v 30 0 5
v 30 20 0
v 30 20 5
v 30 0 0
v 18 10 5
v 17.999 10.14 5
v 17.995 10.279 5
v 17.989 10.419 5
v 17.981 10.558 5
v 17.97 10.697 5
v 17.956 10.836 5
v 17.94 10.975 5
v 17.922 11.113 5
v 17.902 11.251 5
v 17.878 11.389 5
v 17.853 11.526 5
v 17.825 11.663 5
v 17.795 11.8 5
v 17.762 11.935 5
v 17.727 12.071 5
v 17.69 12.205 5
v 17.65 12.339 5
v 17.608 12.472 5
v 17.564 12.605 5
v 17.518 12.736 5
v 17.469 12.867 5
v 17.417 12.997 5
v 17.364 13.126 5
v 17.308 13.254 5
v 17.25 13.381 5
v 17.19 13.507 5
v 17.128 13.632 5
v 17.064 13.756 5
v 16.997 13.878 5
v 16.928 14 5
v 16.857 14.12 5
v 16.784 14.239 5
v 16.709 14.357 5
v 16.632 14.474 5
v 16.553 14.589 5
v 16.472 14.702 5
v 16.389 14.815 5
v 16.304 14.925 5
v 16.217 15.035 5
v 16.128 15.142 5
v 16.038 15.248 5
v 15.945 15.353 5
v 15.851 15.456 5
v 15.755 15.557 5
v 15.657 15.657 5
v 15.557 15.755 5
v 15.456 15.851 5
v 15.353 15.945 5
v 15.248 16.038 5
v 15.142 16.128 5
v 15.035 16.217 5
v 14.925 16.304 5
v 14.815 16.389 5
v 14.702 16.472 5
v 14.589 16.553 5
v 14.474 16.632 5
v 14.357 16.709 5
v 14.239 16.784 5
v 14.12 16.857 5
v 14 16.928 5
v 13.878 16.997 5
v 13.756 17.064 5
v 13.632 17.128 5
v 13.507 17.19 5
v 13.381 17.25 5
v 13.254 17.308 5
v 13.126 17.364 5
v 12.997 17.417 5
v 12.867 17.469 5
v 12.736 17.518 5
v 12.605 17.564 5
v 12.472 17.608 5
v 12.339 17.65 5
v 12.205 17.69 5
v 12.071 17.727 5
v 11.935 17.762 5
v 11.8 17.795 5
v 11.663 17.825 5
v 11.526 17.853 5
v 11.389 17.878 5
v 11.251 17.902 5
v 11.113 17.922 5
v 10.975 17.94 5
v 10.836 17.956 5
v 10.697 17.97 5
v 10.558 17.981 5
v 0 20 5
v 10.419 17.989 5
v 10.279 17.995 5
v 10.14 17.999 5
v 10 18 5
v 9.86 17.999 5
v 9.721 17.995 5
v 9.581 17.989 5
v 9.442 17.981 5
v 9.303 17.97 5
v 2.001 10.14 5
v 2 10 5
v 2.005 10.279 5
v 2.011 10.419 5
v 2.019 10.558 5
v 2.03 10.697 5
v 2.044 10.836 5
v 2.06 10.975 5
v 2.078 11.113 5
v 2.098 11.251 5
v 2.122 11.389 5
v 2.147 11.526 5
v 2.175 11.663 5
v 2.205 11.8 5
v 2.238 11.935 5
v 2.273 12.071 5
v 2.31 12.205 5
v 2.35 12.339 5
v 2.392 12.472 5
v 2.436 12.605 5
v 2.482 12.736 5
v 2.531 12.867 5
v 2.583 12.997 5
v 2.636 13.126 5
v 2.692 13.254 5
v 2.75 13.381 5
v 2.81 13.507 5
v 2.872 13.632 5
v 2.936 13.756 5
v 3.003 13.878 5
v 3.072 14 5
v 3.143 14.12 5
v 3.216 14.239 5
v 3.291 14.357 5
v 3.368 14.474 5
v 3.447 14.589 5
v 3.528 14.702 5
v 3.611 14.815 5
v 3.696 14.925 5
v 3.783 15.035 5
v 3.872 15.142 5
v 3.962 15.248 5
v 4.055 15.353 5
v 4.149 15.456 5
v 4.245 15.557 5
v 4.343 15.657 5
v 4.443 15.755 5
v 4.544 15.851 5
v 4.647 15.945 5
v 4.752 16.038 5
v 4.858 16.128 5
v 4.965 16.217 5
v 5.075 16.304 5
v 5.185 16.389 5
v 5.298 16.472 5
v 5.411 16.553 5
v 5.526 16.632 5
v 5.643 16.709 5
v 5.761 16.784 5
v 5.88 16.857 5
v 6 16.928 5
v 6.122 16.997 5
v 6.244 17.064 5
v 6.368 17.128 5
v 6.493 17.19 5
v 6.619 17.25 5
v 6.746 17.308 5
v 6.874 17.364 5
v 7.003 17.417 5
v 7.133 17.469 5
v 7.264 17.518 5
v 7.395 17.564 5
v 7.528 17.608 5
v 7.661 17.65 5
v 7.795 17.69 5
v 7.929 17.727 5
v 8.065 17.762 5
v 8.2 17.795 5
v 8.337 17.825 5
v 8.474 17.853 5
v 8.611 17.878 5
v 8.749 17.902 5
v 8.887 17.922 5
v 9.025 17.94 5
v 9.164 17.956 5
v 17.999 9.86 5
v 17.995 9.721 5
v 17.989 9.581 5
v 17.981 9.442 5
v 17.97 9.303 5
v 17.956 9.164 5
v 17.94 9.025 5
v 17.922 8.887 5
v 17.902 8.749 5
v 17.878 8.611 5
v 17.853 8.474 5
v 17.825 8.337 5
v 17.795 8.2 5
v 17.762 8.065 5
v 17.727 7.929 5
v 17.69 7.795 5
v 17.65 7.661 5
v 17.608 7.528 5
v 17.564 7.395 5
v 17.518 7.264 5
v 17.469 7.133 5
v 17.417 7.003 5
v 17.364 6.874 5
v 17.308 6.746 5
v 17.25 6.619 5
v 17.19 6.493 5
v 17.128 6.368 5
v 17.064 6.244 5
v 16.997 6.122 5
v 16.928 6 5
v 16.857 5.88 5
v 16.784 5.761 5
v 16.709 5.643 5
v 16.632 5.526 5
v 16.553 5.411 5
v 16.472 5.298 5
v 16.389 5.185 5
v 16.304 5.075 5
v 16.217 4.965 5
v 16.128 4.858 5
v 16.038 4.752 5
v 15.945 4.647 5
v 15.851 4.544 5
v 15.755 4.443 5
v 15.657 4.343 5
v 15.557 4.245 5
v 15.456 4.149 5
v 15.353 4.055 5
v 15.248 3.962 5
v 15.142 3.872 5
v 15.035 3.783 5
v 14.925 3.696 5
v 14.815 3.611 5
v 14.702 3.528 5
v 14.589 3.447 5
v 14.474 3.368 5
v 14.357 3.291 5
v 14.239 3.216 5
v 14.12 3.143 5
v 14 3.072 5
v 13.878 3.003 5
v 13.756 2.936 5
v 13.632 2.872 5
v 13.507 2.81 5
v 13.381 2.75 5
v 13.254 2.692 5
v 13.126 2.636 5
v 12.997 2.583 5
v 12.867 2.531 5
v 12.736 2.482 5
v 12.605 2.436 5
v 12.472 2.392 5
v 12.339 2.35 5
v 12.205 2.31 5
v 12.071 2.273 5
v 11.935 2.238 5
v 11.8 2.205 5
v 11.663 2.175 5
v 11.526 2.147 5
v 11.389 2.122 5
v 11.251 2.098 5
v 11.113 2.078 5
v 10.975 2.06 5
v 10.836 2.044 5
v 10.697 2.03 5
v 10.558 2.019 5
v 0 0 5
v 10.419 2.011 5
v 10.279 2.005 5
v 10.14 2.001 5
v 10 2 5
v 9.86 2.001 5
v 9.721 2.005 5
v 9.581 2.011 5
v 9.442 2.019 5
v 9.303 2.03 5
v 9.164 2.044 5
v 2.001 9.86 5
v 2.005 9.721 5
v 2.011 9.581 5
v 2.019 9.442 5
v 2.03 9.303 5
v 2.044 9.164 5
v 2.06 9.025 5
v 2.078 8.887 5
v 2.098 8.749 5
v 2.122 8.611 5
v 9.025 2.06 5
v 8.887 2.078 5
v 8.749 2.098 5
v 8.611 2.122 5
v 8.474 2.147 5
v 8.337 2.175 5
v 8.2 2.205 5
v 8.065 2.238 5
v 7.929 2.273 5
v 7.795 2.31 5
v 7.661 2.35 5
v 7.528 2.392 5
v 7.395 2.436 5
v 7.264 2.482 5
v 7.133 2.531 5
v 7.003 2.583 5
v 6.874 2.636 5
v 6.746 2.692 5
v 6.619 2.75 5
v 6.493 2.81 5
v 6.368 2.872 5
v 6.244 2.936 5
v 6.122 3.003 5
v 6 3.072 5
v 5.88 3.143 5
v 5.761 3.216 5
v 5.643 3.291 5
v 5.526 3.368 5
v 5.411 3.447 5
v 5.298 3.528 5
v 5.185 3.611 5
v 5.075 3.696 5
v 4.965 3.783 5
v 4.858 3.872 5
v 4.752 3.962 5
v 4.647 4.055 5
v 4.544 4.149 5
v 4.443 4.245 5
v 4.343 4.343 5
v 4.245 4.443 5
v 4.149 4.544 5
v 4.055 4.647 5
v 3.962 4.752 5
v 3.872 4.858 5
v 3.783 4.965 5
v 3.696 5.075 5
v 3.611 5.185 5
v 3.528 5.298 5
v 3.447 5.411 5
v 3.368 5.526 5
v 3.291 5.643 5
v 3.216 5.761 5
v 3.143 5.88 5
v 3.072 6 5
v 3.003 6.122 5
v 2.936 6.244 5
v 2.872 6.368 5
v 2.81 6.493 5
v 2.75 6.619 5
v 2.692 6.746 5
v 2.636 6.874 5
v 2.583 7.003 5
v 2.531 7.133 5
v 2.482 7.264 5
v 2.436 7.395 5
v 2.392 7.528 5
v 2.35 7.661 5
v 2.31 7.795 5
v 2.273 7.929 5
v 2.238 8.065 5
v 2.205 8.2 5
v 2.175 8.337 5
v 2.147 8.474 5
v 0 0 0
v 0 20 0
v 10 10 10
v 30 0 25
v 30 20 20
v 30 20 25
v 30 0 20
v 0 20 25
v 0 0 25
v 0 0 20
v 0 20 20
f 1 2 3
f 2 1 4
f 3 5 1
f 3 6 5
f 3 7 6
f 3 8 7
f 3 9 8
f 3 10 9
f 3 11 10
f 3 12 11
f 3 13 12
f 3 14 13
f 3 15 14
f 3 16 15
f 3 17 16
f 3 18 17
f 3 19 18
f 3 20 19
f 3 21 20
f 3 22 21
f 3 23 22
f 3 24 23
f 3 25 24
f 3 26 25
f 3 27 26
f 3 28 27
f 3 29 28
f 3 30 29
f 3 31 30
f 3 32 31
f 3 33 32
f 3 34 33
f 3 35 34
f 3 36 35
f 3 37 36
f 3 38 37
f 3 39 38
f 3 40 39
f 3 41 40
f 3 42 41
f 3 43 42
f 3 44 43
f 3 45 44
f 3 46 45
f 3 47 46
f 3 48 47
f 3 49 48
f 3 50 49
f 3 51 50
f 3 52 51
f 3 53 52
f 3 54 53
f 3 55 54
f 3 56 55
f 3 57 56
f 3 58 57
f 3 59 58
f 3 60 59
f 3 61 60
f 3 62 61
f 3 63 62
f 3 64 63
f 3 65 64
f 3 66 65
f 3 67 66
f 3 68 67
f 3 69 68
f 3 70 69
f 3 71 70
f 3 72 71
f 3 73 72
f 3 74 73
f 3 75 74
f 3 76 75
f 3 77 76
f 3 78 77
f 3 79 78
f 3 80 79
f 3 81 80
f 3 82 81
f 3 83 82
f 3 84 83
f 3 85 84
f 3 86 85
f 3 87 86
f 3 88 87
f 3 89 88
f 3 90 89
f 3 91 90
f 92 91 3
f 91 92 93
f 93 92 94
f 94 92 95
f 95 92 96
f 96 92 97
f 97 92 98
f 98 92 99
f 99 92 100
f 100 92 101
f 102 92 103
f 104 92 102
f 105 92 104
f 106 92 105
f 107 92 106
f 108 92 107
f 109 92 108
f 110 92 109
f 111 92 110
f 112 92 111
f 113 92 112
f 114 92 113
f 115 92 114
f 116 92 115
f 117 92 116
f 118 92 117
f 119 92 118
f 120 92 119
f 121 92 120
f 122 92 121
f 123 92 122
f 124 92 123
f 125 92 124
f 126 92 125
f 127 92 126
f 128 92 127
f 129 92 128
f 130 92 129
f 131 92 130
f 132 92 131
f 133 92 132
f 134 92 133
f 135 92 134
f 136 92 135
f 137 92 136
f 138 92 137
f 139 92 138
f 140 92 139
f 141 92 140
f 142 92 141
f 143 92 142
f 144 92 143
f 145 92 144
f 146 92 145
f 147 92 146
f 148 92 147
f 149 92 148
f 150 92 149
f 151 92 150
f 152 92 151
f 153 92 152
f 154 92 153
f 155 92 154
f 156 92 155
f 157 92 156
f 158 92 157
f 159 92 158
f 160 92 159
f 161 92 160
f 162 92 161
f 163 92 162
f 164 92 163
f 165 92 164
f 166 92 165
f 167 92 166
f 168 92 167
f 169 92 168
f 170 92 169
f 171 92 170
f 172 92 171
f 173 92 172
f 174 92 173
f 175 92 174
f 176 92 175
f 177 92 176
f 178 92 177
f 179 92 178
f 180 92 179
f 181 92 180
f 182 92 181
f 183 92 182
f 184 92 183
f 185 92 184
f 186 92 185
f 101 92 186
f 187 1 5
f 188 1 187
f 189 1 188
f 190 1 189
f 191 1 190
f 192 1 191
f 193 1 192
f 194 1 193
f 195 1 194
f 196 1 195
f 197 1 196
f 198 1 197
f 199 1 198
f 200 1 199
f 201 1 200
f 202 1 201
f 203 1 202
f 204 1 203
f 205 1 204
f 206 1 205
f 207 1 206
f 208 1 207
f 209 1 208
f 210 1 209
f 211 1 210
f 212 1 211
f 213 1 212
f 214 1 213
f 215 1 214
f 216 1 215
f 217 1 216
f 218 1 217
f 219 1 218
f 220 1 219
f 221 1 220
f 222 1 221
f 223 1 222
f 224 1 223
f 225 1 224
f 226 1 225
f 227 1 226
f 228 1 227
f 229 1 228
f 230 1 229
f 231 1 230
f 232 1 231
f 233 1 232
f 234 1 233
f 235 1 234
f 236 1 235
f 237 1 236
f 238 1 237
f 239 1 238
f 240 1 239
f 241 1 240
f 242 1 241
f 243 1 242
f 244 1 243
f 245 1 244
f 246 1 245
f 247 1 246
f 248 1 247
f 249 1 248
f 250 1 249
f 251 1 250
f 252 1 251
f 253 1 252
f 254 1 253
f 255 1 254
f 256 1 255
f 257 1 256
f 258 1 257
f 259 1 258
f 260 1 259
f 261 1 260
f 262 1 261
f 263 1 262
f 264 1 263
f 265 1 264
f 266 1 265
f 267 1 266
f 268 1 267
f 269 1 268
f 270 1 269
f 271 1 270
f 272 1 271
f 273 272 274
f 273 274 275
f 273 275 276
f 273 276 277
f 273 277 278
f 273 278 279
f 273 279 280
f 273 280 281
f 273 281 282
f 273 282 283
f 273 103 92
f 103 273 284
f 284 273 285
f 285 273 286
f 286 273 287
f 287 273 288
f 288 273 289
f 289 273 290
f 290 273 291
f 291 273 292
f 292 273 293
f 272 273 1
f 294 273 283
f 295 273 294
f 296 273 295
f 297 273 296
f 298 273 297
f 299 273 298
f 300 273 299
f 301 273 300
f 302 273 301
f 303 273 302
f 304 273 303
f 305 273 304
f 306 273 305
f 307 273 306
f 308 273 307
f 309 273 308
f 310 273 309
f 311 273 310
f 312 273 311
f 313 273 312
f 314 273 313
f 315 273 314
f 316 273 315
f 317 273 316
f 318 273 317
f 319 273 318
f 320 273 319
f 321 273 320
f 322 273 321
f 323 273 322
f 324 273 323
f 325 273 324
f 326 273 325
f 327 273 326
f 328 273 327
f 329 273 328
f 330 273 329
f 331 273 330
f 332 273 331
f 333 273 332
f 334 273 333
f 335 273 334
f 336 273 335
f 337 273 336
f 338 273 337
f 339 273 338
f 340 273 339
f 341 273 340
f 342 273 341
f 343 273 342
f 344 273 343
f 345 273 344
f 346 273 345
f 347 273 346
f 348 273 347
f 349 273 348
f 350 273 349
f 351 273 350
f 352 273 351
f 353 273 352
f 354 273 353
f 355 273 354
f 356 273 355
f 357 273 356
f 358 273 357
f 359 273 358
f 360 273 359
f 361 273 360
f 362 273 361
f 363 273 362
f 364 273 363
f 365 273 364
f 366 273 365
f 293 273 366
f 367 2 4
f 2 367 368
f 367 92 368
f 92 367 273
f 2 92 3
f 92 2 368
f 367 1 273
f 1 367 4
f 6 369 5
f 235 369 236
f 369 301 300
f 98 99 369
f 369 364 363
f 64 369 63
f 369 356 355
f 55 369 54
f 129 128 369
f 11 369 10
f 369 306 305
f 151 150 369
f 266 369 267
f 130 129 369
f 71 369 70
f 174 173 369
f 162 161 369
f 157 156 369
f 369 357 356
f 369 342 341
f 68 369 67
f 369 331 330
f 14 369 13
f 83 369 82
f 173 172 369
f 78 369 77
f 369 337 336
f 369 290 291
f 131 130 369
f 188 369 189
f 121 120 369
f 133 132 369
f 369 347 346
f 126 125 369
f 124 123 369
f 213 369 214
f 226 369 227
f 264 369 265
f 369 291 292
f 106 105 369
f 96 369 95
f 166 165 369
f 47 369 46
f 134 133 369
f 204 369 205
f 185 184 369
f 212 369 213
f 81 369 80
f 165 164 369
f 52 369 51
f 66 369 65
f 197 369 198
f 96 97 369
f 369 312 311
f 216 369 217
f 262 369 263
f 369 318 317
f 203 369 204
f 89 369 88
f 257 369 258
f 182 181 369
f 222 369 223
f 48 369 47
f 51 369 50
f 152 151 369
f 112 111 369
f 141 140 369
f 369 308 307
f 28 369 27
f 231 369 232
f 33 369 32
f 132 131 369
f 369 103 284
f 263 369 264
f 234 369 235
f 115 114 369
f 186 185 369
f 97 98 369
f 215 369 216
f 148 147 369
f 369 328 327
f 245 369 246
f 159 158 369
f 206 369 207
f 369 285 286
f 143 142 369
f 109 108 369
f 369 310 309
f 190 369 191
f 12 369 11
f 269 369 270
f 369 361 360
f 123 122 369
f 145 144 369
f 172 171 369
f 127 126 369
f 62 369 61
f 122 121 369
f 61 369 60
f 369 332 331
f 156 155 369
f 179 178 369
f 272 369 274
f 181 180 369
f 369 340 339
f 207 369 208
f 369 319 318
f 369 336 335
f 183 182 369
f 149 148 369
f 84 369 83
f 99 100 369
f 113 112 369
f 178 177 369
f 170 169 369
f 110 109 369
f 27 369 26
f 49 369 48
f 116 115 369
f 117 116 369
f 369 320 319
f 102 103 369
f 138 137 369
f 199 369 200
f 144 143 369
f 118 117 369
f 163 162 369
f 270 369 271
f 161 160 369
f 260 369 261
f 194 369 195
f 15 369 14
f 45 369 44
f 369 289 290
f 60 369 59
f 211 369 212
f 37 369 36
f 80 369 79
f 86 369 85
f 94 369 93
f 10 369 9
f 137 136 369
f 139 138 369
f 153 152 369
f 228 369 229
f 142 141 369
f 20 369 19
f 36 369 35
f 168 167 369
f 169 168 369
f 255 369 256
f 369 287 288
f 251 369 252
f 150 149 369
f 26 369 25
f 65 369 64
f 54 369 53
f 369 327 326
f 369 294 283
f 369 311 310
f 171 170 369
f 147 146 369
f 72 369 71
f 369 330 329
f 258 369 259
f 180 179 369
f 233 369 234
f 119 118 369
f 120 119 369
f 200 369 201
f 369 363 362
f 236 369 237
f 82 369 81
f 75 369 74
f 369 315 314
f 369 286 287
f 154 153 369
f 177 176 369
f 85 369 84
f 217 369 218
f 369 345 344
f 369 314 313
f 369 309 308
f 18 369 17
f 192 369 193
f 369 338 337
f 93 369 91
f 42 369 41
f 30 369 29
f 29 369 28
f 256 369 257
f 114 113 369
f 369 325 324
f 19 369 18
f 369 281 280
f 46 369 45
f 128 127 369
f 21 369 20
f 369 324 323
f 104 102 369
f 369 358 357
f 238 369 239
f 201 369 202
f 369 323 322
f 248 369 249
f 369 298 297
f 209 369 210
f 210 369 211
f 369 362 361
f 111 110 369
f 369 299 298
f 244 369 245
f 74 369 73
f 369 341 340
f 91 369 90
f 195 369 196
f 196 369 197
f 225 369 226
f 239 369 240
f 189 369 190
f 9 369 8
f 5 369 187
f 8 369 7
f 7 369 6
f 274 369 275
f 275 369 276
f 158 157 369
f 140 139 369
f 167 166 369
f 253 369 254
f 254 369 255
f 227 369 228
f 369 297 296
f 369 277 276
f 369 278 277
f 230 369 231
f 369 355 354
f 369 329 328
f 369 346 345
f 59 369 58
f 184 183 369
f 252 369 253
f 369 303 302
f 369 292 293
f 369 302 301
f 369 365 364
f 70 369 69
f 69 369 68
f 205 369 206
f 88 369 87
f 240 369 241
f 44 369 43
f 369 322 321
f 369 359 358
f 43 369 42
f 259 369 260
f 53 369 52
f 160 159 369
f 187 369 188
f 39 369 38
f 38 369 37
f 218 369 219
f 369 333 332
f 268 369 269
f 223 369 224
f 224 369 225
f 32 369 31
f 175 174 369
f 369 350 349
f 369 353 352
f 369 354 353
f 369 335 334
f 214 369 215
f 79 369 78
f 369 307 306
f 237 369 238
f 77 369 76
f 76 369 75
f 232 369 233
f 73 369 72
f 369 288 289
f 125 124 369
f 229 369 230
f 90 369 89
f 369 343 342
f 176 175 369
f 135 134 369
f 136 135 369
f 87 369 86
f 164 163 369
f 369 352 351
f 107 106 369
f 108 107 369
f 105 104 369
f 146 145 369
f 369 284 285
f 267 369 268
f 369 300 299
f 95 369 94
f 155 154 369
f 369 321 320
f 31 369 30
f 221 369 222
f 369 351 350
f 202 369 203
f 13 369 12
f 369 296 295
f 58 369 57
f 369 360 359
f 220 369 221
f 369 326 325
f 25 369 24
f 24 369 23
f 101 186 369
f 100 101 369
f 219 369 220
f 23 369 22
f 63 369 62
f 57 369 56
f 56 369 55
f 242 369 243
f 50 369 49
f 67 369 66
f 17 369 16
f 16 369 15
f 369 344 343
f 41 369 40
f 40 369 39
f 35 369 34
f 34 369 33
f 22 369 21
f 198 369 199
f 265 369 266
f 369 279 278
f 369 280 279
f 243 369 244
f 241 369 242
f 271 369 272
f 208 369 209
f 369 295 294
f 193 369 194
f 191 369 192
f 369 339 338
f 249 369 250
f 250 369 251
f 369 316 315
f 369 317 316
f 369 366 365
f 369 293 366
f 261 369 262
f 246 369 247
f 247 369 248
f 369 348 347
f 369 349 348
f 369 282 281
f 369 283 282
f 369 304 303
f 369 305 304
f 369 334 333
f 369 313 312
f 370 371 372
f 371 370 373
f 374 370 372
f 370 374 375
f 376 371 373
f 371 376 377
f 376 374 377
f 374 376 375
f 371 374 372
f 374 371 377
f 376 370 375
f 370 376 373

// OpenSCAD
$fs = 0.1;
$fa = 1;

cube([30, 20, 5]);
translate([10, 10, 5])
	cylinder(r1=8, r2=0, h=5);

translate([0, 0, 20])
	cube([30, 20, 5]);
